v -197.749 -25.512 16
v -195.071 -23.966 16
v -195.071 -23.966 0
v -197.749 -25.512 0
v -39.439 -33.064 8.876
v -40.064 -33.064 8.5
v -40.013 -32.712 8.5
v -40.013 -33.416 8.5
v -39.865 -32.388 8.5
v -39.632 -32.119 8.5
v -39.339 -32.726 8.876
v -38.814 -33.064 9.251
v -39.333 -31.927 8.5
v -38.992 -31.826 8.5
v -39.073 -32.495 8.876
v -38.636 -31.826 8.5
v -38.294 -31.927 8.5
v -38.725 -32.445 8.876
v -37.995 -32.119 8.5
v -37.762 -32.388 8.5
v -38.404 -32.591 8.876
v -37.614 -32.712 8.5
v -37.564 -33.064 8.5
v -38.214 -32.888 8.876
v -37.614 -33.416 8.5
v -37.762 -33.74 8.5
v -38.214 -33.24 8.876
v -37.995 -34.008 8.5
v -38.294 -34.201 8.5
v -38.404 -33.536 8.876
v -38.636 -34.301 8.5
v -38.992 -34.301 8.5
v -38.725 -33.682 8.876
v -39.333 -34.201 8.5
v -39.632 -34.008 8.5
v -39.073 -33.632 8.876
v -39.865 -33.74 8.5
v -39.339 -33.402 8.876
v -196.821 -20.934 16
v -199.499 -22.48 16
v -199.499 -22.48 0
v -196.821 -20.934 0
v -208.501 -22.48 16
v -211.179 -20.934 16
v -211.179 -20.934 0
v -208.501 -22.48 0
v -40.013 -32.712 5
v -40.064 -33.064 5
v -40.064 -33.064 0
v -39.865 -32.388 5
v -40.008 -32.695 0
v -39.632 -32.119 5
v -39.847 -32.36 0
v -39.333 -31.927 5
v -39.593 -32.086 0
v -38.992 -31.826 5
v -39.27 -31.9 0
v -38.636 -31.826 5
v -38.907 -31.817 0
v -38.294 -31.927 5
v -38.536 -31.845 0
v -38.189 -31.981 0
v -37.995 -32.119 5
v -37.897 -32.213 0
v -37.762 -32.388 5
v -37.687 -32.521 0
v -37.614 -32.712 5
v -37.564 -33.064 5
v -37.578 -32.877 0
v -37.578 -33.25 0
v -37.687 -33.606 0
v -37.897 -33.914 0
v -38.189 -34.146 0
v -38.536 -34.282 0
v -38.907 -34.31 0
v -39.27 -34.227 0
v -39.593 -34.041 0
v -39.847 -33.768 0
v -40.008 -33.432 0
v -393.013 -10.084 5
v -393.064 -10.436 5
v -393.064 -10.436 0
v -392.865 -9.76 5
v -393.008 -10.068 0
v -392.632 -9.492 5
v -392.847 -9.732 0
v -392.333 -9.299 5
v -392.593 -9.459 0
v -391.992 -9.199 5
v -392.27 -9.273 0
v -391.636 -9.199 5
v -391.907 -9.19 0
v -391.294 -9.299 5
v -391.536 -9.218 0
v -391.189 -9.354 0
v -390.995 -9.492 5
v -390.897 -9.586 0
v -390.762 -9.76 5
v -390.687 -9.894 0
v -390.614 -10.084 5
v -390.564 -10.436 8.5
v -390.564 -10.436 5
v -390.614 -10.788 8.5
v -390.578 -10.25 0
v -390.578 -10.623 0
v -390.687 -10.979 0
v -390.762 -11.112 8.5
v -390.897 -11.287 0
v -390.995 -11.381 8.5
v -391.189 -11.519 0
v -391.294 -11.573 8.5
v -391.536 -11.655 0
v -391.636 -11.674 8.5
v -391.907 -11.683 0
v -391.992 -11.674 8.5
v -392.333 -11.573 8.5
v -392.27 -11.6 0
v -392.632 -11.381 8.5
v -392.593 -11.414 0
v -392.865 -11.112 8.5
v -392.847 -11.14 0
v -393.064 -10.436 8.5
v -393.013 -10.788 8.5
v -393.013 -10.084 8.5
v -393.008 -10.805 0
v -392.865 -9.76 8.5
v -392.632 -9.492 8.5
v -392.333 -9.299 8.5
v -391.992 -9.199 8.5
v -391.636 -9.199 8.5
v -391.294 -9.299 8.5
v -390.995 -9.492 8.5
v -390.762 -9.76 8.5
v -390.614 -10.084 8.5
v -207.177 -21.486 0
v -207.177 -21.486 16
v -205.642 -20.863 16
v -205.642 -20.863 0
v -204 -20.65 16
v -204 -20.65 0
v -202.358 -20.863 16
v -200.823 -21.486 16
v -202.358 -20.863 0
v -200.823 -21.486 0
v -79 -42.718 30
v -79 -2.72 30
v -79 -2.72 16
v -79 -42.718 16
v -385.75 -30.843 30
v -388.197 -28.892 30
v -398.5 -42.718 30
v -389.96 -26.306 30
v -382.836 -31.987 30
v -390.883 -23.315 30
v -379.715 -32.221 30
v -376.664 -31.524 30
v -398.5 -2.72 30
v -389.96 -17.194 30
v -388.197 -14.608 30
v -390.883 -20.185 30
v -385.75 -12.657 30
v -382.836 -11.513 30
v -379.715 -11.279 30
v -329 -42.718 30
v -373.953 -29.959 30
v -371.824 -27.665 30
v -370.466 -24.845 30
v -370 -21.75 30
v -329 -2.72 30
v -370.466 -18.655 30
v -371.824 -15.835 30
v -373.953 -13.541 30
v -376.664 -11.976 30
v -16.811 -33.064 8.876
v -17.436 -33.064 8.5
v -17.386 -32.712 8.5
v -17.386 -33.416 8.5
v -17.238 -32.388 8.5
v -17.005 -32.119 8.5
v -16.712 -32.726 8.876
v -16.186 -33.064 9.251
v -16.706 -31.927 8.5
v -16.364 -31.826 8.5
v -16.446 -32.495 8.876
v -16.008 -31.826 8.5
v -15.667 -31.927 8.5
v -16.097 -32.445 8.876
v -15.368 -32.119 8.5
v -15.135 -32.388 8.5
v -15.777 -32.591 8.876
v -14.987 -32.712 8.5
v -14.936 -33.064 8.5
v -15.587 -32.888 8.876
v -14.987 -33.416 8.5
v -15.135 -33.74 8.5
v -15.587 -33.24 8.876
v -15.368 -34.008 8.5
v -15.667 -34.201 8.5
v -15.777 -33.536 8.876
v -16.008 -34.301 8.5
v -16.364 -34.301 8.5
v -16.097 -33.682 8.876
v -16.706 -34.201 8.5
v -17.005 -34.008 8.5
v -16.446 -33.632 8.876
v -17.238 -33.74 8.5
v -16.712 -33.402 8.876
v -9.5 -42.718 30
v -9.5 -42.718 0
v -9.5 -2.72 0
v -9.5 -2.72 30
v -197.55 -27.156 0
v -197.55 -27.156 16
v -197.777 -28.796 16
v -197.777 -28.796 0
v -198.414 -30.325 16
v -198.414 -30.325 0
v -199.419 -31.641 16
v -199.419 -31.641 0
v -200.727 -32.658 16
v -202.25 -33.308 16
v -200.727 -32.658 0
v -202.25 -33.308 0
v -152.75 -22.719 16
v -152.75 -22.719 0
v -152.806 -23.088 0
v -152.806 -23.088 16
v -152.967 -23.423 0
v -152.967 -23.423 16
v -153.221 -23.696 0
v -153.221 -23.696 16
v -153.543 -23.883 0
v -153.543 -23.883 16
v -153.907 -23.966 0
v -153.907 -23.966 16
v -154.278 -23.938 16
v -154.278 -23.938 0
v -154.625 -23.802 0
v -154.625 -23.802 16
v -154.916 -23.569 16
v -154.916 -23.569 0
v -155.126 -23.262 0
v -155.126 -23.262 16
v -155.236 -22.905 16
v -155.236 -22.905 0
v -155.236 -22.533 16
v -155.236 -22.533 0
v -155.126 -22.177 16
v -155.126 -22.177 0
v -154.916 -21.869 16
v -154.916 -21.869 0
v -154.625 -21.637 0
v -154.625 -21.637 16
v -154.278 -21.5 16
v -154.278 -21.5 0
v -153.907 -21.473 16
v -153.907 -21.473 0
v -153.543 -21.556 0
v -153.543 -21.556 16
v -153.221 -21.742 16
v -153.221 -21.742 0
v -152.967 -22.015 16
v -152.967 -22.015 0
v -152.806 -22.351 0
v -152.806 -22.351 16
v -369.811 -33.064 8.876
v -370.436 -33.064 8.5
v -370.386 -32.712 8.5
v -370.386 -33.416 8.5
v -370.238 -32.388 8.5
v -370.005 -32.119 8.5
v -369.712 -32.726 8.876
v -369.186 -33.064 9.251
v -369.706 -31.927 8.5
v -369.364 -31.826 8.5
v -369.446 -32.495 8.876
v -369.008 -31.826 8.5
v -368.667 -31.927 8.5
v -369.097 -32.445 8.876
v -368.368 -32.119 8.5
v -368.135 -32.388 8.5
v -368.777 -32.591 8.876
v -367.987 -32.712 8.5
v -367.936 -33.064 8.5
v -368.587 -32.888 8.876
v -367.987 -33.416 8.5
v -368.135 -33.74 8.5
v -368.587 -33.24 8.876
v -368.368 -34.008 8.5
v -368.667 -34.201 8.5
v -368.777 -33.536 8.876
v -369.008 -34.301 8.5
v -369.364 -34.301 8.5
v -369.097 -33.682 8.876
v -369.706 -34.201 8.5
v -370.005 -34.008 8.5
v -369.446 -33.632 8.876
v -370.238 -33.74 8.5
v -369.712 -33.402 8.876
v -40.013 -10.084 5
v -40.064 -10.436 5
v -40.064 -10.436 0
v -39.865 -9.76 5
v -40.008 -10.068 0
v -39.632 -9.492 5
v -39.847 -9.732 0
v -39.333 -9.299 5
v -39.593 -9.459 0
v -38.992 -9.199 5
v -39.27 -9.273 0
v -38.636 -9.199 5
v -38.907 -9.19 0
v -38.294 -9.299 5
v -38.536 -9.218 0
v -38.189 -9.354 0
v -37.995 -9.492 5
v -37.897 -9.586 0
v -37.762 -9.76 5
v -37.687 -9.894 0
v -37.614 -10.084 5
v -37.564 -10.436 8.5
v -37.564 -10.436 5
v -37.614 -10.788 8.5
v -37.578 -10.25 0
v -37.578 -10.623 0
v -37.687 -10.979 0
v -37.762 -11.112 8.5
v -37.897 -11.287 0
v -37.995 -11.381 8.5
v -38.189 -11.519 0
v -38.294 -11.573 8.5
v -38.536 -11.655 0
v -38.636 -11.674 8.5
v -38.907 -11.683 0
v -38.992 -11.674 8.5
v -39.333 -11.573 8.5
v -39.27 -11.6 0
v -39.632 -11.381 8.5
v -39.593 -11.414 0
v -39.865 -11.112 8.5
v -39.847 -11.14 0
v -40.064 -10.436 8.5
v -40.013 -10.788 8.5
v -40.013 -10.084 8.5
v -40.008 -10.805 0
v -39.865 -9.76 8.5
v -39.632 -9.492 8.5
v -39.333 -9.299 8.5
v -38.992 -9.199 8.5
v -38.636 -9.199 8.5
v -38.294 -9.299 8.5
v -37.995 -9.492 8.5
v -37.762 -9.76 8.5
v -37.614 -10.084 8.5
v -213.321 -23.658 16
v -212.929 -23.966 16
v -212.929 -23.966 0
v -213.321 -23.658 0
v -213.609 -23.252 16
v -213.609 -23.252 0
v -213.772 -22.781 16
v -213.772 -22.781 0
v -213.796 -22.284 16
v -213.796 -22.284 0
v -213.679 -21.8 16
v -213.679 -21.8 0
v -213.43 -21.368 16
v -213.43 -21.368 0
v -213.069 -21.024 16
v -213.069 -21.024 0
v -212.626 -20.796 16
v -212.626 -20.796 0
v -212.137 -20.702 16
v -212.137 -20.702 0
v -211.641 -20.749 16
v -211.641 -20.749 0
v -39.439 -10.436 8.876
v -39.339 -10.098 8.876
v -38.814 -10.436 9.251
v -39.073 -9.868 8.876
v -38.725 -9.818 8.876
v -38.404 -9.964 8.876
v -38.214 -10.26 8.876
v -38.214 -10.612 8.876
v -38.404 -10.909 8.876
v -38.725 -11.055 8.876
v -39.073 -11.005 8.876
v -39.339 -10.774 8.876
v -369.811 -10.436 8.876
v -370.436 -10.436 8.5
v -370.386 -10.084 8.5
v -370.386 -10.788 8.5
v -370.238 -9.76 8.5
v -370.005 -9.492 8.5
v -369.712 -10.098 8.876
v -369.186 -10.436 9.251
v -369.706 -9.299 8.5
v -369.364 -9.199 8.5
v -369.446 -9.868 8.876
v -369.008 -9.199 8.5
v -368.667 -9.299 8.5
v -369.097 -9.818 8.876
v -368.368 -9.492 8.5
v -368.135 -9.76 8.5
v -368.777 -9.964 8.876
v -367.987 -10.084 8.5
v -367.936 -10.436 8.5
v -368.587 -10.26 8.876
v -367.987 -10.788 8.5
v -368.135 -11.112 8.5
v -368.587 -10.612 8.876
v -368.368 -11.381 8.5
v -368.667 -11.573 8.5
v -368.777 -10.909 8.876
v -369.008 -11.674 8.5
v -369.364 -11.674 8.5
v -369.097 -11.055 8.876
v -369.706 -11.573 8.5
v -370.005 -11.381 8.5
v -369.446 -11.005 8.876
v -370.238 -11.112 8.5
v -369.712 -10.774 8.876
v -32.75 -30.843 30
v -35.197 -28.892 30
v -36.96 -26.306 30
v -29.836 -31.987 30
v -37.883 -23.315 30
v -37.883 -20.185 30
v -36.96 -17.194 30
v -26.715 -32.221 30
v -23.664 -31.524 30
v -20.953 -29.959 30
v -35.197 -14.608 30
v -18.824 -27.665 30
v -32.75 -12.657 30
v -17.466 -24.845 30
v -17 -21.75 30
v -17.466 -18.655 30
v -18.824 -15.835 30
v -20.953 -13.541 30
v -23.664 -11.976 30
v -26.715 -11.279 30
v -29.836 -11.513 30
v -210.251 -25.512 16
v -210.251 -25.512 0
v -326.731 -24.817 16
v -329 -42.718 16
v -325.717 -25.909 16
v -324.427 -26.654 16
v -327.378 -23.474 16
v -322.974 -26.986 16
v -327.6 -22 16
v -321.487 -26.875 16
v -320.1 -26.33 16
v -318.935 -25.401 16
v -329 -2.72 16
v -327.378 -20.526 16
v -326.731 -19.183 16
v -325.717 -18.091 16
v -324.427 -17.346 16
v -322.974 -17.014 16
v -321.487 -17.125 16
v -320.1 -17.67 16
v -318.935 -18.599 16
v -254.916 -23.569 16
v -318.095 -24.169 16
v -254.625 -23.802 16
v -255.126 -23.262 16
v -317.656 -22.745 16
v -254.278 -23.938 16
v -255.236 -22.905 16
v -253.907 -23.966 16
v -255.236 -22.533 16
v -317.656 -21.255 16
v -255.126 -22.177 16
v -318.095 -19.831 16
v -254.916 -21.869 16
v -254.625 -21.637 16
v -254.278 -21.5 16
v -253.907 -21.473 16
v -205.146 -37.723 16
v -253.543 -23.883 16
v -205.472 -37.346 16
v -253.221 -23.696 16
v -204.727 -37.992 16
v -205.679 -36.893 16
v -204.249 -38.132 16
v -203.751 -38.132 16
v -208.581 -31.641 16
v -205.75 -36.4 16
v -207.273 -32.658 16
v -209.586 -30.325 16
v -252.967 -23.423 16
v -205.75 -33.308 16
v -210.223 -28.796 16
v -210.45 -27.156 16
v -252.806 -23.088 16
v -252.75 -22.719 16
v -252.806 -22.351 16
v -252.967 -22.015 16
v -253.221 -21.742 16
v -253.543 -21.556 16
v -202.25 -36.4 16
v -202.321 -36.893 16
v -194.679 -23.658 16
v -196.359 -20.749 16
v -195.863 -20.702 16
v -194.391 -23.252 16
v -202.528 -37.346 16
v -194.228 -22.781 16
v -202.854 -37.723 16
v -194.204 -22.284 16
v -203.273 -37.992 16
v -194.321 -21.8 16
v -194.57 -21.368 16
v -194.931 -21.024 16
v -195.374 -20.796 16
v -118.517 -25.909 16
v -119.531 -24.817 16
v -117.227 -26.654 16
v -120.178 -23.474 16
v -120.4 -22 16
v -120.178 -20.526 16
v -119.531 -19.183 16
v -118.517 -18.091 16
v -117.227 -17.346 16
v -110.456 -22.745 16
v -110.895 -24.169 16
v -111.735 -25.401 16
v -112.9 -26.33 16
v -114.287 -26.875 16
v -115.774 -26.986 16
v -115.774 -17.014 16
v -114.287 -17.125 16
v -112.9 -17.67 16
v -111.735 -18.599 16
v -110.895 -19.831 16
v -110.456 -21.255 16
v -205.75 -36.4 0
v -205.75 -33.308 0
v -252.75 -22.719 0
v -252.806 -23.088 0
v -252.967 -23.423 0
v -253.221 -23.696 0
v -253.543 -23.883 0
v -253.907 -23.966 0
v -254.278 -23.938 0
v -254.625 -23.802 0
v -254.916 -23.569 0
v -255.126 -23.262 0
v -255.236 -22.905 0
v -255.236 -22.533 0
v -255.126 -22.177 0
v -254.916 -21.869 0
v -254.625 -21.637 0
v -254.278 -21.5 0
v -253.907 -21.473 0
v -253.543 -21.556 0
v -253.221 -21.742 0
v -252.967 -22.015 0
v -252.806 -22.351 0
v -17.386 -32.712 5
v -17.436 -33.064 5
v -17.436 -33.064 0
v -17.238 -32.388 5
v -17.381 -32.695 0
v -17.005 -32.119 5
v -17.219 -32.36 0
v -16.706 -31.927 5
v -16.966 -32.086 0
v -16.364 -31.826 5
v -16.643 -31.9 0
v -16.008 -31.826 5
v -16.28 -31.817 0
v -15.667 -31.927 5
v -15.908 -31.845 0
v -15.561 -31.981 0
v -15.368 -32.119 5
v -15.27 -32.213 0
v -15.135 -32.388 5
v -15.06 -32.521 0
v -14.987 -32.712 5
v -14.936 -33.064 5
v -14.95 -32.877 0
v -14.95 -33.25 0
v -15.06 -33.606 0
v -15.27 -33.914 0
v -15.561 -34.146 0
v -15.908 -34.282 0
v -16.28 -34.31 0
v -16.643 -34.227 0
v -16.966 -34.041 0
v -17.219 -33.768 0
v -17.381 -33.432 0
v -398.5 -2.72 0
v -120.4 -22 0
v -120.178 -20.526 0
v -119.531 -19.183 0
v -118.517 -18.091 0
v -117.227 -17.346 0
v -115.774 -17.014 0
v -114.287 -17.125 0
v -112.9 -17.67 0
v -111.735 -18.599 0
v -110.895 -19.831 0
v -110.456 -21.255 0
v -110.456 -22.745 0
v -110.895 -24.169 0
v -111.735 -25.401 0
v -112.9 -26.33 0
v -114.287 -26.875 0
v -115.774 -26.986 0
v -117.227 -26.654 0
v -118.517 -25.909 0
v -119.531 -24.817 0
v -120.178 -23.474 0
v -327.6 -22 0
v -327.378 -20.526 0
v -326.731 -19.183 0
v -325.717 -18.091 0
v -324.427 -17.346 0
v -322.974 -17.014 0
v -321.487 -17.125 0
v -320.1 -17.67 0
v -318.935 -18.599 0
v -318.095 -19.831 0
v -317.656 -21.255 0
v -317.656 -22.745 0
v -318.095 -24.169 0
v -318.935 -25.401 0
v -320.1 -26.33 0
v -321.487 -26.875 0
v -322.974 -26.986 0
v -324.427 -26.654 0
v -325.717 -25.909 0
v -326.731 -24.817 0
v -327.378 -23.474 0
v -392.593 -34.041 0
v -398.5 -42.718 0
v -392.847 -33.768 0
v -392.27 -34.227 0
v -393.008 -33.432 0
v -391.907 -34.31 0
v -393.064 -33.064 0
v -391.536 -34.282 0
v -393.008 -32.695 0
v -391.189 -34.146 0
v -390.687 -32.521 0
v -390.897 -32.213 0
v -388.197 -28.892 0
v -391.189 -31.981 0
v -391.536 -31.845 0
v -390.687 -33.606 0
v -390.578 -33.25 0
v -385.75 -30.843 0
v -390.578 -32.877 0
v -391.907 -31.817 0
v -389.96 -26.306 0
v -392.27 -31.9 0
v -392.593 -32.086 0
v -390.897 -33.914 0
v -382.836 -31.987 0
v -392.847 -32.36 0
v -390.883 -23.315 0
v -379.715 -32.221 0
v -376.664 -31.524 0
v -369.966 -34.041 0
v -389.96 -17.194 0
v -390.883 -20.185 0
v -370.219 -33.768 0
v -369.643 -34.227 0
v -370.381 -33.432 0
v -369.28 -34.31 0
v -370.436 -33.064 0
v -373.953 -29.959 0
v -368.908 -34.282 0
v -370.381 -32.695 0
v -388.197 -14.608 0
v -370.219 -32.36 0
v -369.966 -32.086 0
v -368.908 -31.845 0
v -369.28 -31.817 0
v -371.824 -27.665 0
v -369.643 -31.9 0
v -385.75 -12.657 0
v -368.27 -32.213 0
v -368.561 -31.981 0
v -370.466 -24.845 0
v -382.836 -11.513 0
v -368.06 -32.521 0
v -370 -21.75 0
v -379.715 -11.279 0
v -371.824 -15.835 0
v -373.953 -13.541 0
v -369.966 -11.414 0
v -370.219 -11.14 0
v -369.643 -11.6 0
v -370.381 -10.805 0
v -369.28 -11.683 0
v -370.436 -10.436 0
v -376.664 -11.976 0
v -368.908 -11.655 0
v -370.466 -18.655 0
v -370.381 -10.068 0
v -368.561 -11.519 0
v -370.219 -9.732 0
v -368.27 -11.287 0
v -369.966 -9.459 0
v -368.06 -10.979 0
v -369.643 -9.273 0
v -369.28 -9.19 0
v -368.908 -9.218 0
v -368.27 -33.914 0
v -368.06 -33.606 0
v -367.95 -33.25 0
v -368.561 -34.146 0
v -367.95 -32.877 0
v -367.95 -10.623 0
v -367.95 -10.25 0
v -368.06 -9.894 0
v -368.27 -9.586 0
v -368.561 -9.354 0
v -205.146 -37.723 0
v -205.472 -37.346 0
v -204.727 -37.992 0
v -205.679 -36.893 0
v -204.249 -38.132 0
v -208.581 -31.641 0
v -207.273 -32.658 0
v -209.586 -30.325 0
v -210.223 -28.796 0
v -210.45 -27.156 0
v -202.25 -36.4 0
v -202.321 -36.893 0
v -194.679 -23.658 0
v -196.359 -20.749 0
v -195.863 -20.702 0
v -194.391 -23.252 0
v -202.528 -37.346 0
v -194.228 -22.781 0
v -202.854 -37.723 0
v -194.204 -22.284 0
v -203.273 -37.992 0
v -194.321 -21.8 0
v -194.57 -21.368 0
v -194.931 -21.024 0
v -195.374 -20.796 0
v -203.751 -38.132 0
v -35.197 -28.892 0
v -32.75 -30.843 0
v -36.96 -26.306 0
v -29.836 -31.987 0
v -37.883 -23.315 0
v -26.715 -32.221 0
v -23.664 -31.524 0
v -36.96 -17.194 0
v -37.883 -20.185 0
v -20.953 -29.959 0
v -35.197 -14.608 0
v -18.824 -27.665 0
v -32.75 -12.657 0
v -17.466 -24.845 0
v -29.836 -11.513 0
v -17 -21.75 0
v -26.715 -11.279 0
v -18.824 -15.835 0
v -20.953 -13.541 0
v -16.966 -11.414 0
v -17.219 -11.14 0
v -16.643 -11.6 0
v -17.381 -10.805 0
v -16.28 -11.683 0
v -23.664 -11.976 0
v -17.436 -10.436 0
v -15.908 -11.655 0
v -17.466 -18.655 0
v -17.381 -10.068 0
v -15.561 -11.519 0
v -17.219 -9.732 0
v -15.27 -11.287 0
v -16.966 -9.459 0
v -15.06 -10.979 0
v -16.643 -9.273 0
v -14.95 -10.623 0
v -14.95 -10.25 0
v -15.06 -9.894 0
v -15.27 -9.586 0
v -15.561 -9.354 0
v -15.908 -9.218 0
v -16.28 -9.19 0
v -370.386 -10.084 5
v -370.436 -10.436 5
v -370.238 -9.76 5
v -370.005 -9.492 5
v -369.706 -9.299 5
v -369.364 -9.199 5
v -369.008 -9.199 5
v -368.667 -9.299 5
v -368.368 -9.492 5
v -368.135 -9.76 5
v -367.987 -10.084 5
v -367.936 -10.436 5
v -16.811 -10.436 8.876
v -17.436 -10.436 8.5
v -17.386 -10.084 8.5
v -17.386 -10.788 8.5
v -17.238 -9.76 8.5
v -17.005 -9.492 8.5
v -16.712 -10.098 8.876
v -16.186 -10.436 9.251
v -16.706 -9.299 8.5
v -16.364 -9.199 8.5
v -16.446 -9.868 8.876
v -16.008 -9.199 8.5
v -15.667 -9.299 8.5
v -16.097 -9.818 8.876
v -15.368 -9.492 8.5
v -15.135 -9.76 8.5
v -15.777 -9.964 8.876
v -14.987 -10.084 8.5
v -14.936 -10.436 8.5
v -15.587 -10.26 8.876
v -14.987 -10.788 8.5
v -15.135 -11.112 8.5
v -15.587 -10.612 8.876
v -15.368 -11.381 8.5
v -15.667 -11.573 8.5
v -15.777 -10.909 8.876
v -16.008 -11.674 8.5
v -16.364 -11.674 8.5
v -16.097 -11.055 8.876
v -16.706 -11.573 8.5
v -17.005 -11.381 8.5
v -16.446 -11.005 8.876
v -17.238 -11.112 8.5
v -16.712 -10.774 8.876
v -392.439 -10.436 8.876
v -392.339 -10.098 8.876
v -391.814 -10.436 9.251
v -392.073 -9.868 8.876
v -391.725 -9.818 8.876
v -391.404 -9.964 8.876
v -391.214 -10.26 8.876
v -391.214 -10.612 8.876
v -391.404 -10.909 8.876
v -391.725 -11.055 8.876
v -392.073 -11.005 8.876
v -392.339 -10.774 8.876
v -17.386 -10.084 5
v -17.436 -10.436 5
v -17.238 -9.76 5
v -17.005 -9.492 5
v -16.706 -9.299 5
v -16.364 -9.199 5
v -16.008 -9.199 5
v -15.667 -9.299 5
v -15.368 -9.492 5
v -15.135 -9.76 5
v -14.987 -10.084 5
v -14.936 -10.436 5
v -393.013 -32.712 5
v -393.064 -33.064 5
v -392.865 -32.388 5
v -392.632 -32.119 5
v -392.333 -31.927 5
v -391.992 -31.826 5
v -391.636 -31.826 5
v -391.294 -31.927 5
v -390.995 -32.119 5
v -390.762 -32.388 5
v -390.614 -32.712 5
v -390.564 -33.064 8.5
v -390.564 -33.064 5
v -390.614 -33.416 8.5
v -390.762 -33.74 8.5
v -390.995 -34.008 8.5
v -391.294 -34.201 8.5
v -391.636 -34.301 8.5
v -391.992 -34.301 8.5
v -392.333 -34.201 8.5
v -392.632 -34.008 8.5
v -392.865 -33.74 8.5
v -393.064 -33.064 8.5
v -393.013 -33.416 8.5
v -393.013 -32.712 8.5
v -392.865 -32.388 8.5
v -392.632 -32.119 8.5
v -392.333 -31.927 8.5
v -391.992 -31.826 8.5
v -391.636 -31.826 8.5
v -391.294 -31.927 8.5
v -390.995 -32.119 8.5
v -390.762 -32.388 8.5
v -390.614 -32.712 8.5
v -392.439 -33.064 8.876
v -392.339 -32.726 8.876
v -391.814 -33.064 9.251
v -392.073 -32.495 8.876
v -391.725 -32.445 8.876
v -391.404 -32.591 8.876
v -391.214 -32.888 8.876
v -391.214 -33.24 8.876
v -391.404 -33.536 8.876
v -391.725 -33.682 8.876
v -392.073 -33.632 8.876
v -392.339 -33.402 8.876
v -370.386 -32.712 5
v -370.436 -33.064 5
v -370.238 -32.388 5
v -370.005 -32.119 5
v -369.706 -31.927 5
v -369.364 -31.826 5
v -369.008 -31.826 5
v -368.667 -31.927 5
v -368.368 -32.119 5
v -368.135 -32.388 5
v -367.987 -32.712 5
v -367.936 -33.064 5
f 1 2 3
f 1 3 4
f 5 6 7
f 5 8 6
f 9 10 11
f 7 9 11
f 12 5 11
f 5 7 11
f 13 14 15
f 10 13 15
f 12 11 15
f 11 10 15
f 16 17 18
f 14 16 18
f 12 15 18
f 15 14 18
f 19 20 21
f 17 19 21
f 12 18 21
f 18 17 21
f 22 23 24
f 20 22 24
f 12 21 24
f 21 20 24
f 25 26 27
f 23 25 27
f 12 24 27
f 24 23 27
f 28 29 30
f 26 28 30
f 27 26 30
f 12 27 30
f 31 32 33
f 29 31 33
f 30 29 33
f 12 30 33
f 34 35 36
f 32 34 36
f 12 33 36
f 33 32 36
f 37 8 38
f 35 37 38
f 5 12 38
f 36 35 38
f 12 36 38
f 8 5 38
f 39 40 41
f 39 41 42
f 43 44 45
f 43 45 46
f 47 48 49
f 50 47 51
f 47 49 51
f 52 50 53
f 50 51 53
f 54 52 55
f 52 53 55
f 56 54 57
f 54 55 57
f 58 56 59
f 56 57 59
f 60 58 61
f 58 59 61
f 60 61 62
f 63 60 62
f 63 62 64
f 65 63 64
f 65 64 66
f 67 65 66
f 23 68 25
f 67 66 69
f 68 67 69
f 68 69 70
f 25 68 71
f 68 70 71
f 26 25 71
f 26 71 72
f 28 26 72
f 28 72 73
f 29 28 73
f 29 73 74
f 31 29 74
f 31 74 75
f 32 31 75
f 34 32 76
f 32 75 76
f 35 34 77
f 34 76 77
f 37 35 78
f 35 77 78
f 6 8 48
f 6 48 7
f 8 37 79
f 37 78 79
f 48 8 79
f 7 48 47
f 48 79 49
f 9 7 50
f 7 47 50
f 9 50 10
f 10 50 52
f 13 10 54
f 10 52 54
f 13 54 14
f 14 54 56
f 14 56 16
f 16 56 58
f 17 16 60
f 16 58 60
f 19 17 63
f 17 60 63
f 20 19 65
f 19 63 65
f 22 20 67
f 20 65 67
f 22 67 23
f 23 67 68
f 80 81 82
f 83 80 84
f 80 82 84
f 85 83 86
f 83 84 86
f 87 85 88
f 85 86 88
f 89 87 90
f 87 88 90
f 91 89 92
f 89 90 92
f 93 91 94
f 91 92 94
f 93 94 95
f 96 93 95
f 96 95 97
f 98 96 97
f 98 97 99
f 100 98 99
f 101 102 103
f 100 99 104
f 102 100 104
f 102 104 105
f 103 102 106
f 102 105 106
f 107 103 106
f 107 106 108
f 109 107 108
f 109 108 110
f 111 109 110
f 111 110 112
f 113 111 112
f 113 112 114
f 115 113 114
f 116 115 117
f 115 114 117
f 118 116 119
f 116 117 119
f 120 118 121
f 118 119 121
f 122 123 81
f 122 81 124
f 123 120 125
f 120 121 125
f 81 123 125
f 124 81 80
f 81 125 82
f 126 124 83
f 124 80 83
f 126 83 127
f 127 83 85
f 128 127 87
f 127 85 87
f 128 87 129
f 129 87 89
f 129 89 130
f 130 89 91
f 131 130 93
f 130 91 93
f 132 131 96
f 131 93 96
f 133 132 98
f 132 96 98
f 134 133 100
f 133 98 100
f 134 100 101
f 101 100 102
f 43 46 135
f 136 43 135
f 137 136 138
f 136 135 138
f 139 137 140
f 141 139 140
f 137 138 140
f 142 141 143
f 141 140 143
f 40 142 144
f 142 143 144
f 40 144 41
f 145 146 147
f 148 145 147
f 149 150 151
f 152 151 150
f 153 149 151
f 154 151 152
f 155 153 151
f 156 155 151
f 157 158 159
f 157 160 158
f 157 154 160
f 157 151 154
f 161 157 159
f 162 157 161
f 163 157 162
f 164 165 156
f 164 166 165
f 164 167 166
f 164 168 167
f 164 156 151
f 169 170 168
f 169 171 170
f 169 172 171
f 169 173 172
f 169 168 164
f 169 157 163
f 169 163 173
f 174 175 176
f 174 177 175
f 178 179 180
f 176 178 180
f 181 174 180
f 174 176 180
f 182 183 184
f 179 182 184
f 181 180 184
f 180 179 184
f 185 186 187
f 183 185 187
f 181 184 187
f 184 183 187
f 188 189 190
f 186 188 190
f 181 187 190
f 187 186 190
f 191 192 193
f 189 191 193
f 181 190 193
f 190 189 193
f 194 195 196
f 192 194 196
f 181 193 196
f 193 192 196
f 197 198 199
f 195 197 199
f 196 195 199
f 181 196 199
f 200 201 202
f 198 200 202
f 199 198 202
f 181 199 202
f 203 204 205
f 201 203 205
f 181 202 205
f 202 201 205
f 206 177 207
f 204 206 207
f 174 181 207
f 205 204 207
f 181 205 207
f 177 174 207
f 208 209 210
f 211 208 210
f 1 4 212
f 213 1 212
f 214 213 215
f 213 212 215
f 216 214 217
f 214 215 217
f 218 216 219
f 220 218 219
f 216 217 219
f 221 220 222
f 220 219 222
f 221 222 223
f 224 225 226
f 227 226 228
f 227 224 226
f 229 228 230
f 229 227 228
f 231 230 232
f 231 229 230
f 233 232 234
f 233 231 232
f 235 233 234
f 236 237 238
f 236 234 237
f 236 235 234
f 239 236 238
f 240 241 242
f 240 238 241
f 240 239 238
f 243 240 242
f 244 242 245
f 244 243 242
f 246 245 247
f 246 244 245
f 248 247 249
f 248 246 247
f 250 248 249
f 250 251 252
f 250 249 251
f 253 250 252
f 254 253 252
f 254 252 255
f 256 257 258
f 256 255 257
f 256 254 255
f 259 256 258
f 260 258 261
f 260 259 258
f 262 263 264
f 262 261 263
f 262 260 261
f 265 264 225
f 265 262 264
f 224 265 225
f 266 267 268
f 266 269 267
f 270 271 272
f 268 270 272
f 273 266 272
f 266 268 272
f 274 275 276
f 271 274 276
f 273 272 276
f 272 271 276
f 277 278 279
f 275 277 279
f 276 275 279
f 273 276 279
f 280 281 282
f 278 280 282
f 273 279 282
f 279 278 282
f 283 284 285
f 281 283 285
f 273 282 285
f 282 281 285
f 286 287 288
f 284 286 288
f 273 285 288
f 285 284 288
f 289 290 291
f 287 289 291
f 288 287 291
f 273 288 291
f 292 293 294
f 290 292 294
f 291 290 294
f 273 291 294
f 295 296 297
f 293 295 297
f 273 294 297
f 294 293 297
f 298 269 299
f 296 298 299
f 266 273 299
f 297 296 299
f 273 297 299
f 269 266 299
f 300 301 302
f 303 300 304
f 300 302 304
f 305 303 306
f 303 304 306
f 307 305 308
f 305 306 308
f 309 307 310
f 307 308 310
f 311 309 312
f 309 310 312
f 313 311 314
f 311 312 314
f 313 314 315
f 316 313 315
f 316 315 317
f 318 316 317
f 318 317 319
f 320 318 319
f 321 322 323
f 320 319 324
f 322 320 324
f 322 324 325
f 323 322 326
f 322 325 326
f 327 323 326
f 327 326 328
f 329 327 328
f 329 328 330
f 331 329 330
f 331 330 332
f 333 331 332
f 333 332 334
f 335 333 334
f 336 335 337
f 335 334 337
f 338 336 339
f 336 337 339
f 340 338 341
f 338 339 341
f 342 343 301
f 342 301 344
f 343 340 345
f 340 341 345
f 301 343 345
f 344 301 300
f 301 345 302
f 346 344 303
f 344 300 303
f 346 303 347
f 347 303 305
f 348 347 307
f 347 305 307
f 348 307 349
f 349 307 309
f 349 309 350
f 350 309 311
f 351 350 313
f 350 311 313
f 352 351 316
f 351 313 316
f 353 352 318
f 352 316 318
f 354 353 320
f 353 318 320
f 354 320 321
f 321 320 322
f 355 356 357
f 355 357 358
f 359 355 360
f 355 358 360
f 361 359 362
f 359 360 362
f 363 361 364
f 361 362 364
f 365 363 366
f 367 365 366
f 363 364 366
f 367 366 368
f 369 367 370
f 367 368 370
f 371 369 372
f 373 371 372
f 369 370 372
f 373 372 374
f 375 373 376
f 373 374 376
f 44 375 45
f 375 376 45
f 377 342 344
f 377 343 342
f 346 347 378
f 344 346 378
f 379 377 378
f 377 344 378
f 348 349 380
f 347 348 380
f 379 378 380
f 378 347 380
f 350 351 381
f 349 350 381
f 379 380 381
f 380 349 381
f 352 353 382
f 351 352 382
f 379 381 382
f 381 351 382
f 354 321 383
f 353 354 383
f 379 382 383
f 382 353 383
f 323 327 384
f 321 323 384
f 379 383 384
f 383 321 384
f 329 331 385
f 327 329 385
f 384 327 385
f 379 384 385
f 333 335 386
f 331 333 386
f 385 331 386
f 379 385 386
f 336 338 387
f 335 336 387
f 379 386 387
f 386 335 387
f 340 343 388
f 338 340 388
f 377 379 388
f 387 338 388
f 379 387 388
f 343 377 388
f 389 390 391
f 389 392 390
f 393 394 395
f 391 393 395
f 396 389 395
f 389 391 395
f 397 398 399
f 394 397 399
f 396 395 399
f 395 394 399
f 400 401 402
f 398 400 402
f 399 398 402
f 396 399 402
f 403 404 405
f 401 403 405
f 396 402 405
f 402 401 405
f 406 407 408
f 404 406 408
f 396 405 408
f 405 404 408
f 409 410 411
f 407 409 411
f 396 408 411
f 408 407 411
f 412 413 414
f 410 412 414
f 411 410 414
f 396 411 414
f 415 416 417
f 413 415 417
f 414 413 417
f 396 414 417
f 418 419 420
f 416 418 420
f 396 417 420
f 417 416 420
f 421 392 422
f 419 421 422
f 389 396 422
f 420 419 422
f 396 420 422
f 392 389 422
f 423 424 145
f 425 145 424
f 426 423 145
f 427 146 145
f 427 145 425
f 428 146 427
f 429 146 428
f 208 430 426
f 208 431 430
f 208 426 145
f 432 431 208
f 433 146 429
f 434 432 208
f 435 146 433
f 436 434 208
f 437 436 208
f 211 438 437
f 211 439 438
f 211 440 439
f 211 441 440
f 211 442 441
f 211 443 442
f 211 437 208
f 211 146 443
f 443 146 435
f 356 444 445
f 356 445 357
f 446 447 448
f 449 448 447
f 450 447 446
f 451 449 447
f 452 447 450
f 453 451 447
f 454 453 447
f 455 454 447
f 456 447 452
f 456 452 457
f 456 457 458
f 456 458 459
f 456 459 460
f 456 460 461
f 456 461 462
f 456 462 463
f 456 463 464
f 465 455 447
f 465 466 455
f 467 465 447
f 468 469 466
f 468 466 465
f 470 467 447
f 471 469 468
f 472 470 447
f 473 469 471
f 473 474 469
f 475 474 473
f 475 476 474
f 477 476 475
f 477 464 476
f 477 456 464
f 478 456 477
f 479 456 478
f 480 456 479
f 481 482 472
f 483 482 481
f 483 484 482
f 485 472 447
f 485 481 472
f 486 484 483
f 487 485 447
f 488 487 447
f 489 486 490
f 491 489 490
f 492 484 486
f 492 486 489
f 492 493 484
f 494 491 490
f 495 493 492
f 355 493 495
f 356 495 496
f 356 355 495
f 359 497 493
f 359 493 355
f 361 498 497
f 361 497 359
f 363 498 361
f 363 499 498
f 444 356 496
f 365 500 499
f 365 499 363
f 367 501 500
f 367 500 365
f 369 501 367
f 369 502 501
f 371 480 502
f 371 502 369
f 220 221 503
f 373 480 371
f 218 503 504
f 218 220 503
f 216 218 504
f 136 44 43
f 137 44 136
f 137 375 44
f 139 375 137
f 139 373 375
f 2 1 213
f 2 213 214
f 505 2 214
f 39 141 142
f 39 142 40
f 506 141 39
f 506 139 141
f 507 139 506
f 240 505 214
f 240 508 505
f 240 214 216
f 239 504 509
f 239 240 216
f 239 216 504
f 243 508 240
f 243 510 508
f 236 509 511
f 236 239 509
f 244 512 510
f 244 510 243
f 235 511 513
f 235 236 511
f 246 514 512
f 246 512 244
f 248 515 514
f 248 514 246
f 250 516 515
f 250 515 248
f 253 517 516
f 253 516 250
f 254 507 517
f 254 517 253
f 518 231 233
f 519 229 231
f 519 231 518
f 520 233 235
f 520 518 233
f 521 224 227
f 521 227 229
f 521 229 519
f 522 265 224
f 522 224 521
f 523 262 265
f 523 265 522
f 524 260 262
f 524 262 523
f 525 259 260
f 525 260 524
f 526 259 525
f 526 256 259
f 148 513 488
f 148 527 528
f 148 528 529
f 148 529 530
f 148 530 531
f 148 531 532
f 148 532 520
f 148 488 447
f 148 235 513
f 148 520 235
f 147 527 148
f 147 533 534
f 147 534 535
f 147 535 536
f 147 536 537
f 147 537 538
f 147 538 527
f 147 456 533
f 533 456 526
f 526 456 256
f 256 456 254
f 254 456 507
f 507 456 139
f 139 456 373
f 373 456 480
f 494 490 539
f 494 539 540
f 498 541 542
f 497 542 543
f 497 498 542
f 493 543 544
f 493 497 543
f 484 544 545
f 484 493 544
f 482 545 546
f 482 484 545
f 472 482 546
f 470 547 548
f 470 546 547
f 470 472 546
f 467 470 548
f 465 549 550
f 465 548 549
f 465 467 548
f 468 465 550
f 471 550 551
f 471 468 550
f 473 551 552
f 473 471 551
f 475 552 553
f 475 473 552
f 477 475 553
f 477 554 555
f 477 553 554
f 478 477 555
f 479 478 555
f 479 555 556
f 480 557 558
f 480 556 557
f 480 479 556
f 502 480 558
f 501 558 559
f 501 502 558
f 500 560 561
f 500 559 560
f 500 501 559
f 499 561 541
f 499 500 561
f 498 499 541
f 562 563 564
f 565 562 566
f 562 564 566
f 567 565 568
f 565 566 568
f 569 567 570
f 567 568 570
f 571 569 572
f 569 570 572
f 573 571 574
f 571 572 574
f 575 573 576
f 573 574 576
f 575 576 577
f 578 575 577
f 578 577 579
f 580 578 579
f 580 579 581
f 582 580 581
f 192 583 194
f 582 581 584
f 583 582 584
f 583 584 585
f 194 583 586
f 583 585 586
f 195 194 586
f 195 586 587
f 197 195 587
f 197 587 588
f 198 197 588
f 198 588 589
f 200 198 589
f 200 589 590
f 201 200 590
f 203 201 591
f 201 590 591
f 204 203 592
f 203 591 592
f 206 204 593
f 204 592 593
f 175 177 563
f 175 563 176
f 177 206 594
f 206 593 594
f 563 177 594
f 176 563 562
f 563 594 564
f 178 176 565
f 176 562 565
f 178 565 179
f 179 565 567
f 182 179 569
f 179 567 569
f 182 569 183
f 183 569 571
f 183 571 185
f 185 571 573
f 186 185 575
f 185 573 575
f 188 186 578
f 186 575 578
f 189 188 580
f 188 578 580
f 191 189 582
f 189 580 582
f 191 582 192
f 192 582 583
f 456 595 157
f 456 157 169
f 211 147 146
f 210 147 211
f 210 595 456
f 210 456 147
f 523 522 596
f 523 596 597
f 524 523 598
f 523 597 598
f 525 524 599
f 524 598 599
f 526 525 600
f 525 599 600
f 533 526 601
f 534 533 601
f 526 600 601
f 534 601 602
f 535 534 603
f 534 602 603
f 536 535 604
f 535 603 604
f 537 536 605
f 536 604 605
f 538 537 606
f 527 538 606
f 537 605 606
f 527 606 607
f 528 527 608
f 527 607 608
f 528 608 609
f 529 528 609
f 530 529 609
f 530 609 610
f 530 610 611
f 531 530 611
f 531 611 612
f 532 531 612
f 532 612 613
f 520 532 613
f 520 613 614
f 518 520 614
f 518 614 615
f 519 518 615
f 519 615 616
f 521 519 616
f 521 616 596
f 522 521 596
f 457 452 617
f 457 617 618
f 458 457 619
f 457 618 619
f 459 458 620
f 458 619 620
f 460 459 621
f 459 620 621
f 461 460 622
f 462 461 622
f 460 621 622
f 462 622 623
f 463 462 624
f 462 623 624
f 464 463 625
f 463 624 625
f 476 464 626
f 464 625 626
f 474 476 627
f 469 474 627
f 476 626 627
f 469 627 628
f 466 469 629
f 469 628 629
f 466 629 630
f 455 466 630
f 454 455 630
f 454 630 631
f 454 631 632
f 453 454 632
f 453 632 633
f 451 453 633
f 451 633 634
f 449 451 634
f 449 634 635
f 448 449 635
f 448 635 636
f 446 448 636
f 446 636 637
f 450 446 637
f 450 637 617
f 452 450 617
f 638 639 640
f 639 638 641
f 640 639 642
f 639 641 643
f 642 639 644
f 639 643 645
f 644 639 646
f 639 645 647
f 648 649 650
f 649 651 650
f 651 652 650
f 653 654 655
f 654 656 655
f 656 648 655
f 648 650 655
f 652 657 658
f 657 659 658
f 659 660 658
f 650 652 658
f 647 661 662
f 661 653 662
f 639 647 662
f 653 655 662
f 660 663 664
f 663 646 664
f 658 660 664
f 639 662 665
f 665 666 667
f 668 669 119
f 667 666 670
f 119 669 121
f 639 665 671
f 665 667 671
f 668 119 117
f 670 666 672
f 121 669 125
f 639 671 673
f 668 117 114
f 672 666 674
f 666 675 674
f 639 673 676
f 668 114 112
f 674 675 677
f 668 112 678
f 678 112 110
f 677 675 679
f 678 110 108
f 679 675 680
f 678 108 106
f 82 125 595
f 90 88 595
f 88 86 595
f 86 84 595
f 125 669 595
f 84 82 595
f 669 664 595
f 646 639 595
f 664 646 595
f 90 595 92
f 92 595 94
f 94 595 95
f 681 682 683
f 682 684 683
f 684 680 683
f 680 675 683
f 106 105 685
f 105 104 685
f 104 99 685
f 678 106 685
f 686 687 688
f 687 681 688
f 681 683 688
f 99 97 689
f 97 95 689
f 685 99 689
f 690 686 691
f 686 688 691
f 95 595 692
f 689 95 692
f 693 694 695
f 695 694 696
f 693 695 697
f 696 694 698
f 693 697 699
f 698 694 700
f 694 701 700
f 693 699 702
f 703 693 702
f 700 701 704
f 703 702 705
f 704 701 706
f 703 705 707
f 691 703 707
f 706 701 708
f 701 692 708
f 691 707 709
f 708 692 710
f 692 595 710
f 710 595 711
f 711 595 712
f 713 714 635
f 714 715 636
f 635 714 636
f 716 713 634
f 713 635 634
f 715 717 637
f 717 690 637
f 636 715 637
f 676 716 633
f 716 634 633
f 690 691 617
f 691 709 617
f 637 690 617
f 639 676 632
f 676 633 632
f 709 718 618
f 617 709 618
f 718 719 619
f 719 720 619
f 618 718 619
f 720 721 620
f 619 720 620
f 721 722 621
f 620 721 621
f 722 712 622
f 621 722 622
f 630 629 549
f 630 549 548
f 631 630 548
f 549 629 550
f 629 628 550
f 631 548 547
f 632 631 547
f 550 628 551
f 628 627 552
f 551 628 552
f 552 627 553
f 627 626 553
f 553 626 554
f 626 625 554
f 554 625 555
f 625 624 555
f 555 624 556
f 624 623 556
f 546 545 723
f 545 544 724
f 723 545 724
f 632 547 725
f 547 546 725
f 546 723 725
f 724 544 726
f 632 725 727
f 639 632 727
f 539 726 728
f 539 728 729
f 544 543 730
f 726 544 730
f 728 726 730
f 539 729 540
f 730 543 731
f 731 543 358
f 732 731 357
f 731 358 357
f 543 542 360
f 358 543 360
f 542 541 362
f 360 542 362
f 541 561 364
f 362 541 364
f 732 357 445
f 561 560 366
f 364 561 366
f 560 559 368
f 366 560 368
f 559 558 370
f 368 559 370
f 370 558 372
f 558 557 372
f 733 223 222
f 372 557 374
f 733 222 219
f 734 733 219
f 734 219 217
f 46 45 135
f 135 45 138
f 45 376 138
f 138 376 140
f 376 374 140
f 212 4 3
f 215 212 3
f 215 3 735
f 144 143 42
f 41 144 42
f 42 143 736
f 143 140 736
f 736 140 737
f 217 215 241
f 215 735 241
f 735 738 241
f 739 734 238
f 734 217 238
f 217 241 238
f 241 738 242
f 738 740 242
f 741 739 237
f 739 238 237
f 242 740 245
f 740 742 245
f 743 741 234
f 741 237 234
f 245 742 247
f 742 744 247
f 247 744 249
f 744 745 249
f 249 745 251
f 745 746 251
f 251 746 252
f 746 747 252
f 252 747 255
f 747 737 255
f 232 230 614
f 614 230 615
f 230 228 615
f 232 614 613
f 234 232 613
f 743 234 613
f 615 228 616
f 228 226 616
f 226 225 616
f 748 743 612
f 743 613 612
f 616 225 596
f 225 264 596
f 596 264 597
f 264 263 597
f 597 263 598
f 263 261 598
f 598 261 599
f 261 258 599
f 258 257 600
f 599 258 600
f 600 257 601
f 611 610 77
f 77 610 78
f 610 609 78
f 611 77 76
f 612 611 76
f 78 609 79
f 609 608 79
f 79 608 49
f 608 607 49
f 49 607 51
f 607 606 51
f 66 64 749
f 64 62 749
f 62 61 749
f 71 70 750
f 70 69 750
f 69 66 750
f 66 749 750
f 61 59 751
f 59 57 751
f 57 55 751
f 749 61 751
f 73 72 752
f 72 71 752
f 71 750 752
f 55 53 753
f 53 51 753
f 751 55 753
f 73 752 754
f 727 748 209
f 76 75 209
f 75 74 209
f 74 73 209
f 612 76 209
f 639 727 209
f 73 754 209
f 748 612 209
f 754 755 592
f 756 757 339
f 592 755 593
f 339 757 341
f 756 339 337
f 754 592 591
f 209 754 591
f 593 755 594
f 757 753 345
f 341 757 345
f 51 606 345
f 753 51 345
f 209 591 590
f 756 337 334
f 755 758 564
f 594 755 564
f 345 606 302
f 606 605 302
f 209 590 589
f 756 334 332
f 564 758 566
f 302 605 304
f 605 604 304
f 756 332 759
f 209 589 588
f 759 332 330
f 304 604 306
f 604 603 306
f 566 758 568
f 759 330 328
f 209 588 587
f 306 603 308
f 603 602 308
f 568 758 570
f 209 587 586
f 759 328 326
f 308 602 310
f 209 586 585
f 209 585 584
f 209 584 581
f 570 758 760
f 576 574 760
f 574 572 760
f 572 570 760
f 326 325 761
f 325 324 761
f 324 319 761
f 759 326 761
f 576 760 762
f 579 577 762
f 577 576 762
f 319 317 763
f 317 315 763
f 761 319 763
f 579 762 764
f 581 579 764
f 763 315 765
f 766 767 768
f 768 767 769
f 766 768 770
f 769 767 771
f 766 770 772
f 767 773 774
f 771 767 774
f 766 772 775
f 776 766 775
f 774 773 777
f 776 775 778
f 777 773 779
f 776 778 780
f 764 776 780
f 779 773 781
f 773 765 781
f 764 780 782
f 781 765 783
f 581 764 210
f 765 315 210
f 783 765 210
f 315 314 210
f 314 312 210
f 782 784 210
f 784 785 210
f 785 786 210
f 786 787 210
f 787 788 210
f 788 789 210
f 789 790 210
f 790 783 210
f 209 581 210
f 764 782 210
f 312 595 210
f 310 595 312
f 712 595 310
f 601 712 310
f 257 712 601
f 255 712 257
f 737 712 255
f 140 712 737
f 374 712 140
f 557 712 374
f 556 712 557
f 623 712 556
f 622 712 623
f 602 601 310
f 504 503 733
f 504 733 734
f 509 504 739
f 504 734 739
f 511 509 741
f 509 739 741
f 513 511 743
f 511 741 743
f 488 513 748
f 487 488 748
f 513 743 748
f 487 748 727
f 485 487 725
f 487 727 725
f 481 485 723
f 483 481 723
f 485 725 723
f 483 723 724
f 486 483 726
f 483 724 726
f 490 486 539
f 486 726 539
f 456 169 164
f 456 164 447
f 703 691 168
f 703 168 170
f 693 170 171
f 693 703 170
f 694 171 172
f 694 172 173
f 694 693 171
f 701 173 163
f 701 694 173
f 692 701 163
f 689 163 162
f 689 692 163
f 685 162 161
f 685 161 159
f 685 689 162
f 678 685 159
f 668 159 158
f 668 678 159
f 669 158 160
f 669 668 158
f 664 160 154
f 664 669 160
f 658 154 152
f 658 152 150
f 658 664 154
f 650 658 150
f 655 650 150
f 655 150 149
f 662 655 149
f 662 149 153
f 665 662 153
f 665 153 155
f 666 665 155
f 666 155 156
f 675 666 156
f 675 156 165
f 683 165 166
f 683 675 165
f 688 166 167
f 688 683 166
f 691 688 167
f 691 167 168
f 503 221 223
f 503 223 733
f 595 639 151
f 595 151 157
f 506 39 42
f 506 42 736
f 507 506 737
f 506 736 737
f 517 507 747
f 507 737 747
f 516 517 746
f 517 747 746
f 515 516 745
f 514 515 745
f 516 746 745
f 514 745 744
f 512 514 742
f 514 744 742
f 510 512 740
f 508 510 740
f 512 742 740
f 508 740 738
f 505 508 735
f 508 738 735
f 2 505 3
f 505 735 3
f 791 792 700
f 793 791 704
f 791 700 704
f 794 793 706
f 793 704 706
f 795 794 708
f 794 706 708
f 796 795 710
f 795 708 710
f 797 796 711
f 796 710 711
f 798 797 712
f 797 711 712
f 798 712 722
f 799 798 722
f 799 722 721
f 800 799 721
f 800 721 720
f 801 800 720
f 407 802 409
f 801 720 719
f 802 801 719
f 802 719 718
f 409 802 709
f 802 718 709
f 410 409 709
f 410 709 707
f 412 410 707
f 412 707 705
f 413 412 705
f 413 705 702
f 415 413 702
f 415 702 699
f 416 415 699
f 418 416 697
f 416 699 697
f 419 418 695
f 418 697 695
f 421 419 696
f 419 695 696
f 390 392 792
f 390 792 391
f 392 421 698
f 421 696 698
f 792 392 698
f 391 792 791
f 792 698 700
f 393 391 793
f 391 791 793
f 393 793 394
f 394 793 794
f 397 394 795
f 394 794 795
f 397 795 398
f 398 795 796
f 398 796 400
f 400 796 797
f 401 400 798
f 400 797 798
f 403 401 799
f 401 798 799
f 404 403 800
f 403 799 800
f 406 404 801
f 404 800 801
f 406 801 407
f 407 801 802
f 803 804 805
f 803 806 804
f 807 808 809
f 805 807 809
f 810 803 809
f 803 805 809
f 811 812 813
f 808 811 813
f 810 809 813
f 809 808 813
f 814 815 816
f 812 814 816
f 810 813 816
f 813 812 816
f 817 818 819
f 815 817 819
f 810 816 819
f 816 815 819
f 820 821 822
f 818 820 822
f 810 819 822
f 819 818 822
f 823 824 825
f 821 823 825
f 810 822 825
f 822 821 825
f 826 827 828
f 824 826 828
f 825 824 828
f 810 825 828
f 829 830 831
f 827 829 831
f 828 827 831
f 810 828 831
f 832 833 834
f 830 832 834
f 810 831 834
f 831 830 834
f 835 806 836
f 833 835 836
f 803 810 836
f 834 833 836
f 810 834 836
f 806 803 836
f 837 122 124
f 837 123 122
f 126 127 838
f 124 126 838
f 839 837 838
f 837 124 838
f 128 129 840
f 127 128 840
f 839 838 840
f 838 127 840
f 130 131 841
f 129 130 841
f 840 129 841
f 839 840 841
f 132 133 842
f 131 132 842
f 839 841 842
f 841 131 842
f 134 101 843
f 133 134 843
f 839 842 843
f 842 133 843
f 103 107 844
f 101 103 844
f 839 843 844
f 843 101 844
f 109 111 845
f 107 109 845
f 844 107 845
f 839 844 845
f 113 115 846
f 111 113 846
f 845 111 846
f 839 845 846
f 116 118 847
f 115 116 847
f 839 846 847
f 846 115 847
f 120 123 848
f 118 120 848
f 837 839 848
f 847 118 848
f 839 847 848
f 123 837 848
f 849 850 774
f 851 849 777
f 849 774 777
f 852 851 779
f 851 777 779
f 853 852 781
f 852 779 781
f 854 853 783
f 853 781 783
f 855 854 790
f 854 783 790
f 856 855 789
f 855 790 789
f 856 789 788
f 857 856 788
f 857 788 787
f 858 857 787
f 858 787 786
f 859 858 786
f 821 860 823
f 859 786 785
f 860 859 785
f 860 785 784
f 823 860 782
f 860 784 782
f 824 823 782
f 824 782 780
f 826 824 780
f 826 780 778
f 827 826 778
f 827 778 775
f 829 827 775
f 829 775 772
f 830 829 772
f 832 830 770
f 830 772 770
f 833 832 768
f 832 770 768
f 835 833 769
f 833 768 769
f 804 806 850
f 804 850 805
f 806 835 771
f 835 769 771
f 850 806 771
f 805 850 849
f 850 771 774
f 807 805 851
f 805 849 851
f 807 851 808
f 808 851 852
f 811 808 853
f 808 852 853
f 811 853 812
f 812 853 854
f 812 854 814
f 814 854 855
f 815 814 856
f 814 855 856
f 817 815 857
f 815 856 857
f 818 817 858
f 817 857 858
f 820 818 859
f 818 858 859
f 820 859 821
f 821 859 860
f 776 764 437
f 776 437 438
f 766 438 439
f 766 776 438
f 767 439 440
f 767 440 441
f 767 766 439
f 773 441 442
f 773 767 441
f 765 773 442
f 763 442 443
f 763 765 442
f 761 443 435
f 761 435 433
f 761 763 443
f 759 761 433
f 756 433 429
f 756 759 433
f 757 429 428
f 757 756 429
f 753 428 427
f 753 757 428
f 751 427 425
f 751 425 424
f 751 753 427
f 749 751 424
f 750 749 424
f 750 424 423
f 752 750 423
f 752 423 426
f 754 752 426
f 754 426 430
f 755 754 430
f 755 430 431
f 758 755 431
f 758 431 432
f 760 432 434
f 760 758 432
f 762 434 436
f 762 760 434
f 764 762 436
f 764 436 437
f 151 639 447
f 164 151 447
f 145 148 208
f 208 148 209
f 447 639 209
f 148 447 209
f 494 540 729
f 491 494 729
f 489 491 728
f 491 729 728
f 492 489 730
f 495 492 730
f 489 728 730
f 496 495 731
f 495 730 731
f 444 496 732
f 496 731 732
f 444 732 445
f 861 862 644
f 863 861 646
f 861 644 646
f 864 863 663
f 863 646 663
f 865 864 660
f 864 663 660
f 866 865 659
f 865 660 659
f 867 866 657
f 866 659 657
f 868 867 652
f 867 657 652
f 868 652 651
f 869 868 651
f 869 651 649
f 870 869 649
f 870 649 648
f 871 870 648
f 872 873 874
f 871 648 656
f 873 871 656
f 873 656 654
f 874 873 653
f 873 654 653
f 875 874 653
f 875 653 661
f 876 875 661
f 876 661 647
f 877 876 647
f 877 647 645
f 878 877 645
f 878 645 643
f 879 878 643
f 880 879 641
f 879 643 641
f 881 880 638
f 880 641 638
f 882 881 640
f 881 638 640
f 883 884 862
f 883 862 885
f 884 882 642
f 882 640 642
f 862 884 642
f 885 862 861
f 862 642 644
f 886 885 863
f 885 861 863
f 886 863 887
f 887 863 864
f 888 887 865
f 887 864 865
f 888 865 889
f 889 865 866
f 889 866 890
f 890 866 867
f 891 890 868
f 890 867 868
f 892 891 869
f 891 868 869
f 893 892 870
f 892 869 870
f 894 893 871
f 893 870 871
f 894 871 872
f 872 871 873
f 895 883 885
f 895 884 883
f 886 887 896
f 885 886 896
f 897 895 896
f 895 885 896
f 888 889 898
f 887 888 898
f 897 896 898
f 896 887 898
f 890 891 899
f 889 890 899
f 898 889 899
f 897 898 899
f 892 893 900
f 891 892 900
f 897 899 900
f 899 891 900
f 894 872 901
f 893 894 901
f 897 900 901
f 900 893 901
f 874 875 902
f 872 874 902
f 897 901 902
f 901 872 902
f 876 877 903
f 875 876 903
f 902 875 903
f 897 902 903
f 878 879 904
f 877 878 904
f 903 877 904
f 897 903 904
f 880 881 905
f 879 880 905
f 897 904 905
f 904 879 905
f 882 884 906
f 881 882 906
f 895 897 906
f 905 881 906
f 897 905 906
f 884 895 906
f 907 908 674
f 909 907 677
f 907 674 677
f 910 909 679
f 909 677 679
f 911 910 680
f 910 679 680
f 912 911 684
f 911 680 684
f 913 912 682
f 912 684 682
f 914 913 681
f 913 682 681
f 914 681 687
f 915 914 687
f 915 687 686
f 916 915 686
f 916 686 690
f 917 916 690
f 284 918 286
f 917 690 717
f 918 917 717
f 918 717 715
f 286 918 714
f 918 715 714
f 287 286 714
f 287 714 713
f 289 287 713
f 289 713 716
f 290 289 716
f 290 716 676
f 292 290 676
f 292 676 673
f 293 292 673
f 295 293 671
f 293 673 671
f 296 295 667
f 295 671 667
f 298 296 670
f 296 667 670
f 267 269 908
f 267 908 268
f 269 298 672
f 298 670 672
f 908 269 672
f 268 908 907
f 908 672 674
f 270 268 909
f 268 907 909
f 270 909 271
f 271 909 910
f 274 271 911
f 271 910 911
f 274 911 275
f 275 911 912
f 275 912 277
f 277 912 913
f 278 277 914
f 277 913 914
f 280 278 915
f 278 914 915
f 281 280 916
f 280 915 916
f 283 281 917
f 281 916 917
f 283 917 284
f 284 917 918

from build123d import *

# Parameters (mm, degrees)
SKETCH1_W                           = 389
SKETCH1_H                           = 39.998298848
SKETCH1_R                           = 10.5
SKETCH1_R_2                         = 6.35
MAIN_BODY_DEPTH                     = 30
Z_START                             = 16
SKETCH1_4_R                         = 10.25
SKETCH1_4_R_2                       = 6.35
Z_NUT_FLANGE_RECESS_DEPTH           = 20
SKETCH2_R                           = 1.25
LINEAR_BEARINGS_M3_PILOTS_DEPTH     = 5
SKETCH3_R                           = 6.35
Z_NUT_SCREW_THROUGH_HOLE_DEPTH      = 30
STEPPER_CUT_REACH                   = 403.624
SKETCH4_W                           = 250
SKETCH4_H                           = 21
M3_TAPPED_HOLE1_D                   = 2.5
M3_TAPPED_HOLE1_DEPTH               = 8.5
M3_TAPPED_HOLE1_TIP                 = 0.751075774
Z_NUT_SCREW_CLEARENCE_REACH         = 403.904
Z_NUT_SCREW_CLEARENCE_PATTERN_COUNT = 3
INSERT_THROUGH_HOLE_LOWER_G_REACH   = 403.904
SKETCH13_R                          = 5
CABLE_START                         = -16
SKETCH15_R                          = 1.25
CABLE_CLIPS_M3_PILOTS_DEPTH         = 418.904345655
M3_TAPPED_HOLE2_D                   = 2.5


with BuildPart() as part:
    # Sketch1 → Main Body (new body)
    with BuildSketch(Plane.XY):
        with Locations((-204, -22.719149424)):
            Rectangle(SKETCH1_W, SKETCH1_H)
        with Locations((-380.5, -21.75)):
            Circle(SKETCH1_R, mode=Mode.SUBTRACT)
        with Locations((-27.5, -21.75)):
            Circle(SKETCH1_R, mode=Mode.SUBTRACT)
        with Locations((-204, -27.1)):
            Circle(SKETCH1_R_2, mode=Mode.SUBTRACT)
    extrude(amount=MAIN_BODY_DEPTH)

    # Sketch1<4> → Z Nut Flange Recess (cut)
    with BuildSketch(Plane.XY.offset(Z_START)):
        with Locations((-204, -27.1)):
            Circle(SKETCH1_4_R)
        with Locations((-204, -27.1)):
            Circle(SKETCH1_4_R_2, mode=Mode.SUBTRACT)
        with Locations((-204, -27.1)):
            Circle(SKETCH1_4_R_2)
    extrude(amount=Z_NUT_FLANGE_RECESS_DEPTH, mode=Mode.SUBTRACT)

    # Sketch2 → Linear Bearings - M3 Pilots (cut)
    with BuildSketch(Plane(origin=(0, 0, 0), x_dir=(-1, 0, 0), z_dir=(0, 0, -1))):
        with Locations((16.186291501, -10.436291501)):
            Circle(SKETCH2_R)
        with Locations((38.813708499, -10.436291501)):
            Circle(SKETCH2_R)
        with Locations((16.186291501, -33.063708499)):
            Circle(SKETCH2_R)
        with Locations((38.813708499, -33.063708499)):
            Circle(SKETCH2_R)
        with Locations((369.186291501, -10.436291501)):
            Circle(SKETCH2_R)
        with Locations((391.813708499, -10.436291501)):
            Circle(SKETCH2_R)
        with Locations((369.186291501, -33.063708499)):
            Circle(SKETCH2_R)
        with Locations((391.813708499, -33.063708499)):
            Circle(SKETCH2_R)
    extrude(amount=-LINEAR_BEARINGS_M3_PILOTS_DEPTH, mode=Mode.SUBTRACT)

    # Sketch3 → Z Nut - Screw Through Hole (cut)
    with BuildSketch(Plane(origin=(0, 0, 0), x_dir=(-1, 0, 0), z_dir=(0, 0, -1))):
        with BuildLine():
            Line((205.55, -35.15), (205.55, -33.360990337))
            ThreePointArc((205.55, -33.360990337), (209.585863854, -30.325), (210.197176685, -25.311844207))
            Line((210.197176685, -25.311844207), (211.7465045, -24.417339376))
            ThreePointArc((211.7465045, -24.417339376), (212.313843876, -22.3), (210.1965045, -21.732660624))
            Line((210.1965045, -21.732660624), (208.647176685, -22.627165456))
            ThreePointArc((208.647176685, -22.627165456), (204, -20.65), (199.352823315, -22.627165456))
            Line((199.352823315, -22.627165456), (197.8034955, -21.732660624))
            ThreePointArc((197.8034955, -21.732660624), (195.686156124, -22.3), (196.2534955, -24.417339376))
            Line((196.2534955, -24.417339376), (197.802823315, -25.311844207))
            ThreePointArc((197.802823315, -25.311844207), (198.414136146, -30.325), (202.45, -33.360990337))
            Line((202.45, -33.360990337), (202.45, -35.15))
            ThreePointArc((202.45, -35.15), (204, -36.7), (205.55, -35.15))
        make_face()
        with Locations((204, -27.1)):
            Circle(SKETCH3_R, mode=Mode.SUBTRACT)
    extrude(amount=-Z_NUT_SCREW_THROUGH_HOLE_DEPTH, mode=Mode.SUBTRACT)

    # Sketch4 → Stepper Cut (cut, up to next)
    with BuildSketch(Plane(origin=(0, -2.72, 0), x_dir=(1, 0, 0), z_dir=(0, 1, 0)), mode=Mode.PRIVATE) as stepper_cut_sk1:
        with Locations((-204, -26.5)):
            Rectangle(SKETCH4_W, SKETCH4_H)
    stepper_cut_tool1 = extrude(stepper_cut_sk1.sketch, amount=-STEPPER_CUT_REACH, mode=Mode.PRIVATE) & part.part
    add(stepper_cut_tool1.solids().sort_by_distance((-204, -2.72, 26.5))[0], mode=Mode.SUBTRACT)

    # M3 Tapped Hole1
    with Locations(Plane(origin=(-16.186291501, -33.063708499, 0), x_dir=(-1, 0, 0), z_dir=(0, 0, -1))):
        with Locations((0, 0), (22.627416998, 0), (22.627416998, 22.627416998), (0, 22.627416998), (375.627416998, 22.627416998), (353, 22.627416998), (353, 0), (375.627416998, 0)):
            Hole(M3_TAPPED_HOLE1_D / 2, depth=M3_TAPPED_HOLE1_DEPTH)
            with Locations((0, 0, -(M3_TAPPED_HOLE1_DEPTH + M3_TAPPED_HOLE1_TIP / 2))):  # 118° drill point
                Cone(0, M3_TAPPED_HOLE1_D / 2, M3_TAPPED_HOLE1_TIP, mode=Mode.SUBTRACT)

    # Sketch12 → Z Nut Screw Clearence (cut, up to next)
    with BuildSketch(Plane(origin=(0, 0, 0), x_dir=(-1, 0, 0), z_dir=(0, 0, -1)), mode=Mode.PRIVATE) as z_nut_screw_clearence_sk1:
        with BuildLine():
            Line((205.75, -36.4), (205.75, -33.308059278))
            ThreePointArc((205.75, -33.308059278), (205.650212236, -33.335326742), (205.55, -33.360990337))
            Line((205.55, -33.360990337), (205.55, -35.15))
            ThreePointArc((205.55, -35.15), (204, -36.7), (202.45, -35.15))
            Line((202.45, -35.15), (202.45, -33.360990337))
            ThreePointArc((202.45, -33.360990337), (202.349787764, -33.335326742), (202.25, -33.308059278))
            Line((202.25, -33.308059278), (202.25, -36.4))
            ThreePointArc((202.25, -36.4), (204, -38.15), (205.75, -36.4))
        make_face()
    z_nut_screw_clearence_tool1 = extrude(z_nut_screw_clearence_sk1.sketch, amount=-Z_NUT_SCREW_CLEARENCE_REACH, mode=Mode.PRIVATE) & part.part
    z_nut_screw_clearence = z_nut_screw_clearence_tool1.solids().sort_by_distance((-202.309745, -34.85403, 0))[0]
    add(z_nut_screw_clearence, mode=Mode.SUBTRACT)

    # Z Nut Screw Clearence Pattern: Z Nut Screw Clearence ×3 about axis
    z_nut_screw_clearence_pattern_axis = Axis((-204, -27.1, 0), (0, 0, 1))
    for i in range(1, Z_NUT_SCREW_CLEARENCE_PATTERN_COUNT):
        add(z_nut_screw_clearence.rotate(z_nut_screw_clearence_pattern_axis, i * 360 / Z_NUT_SCREW_CLEARENCE_PATTERN_COUNT), mode=Mode.SUBTRACT)

    # Sketch13 → Insert Through Hole - Lower G (cut, up to next)
    with BuildSketch(Plane(origin=(0, 0, 0), x_dir=(-1, 0, 0), z_dir=(0, 0, -1)), mode=Mode.PRIVATE) as insert_through_hole_lower_g_sk1:
        with Locations((115.4, -22)):
            Circle(SKETCH13_R)
    insert_through_hole_lower_g_tool1 = extrude(insert_through_hole_lower_g_sk1.sketch, amount=-INSERT_THROUGH_HOLE_LOWER_G_REACH, mode=Mode.PRIVATE) & part.part
    # Sketch13 → Insert Through Hole - Lower G (cut, up to next)
    with BuildSketch(Plane(origin=(0, 0, 0), x_dir=(-1, 0, 0), z_dir=(0, 0, -1)), mode=Mode.PRIVATE) as insert_through_hole_lower_g_sk2:
        with Locations((322.6, -22)):
            Circle(SKETCH13_R)
    insert_through_hole_lower_g_tool2 = extrude(insert_through_hole_lower_g_sk2.sketch, amount=-INSERT_THROUGH_HOLE_LOWER_G_REACH, mode=Mode.PRIVATE) & part.part
    add(insert_through_hole_lower_g_tool1.solids().sort_by_distance((-115.4, -22, 0))[0], mode=Mode.SUBTRACT)
    add(insert_through_hole_lower_g_tool2.solids().sort_by_distance((-322.6, -22, 0))[0], mode=Mode.SUBTRACT)

    # Sketch15 → Cable Clips - M3 Pilots (cut, through all)
    with BuildSketch(Plane(origin=(0, 0, 0), x_dir=(-1, 0, 0), z_dir=(0, 0, -1)).offset(CABLE_START)):
        with Locations(Location((154, -22.719149424, 0), (0, 0, 180))):
            Circle(SKETCH15_R)
        with Locations(Location((254, -22.719149424, 0), (0, 0, 180))):
            Circle(SKETCH15_R)
    extrude(amount=CABLE_CLIPS_M3_PILOTS_DEPTH, mode=Mode.SUBTRACT)

    # M3 Tapped Hole2 (through all)
    with Locations(Plane(origin=(-154, -22.719149424, 16), x_dir=(1, 0, 0), z_dir=(0, 0, 1))):
        with Locations((0, 0), (-100, 0)):
            Hole(M3_TAPPED_HOLE2_D / 2)


solid = part.part
